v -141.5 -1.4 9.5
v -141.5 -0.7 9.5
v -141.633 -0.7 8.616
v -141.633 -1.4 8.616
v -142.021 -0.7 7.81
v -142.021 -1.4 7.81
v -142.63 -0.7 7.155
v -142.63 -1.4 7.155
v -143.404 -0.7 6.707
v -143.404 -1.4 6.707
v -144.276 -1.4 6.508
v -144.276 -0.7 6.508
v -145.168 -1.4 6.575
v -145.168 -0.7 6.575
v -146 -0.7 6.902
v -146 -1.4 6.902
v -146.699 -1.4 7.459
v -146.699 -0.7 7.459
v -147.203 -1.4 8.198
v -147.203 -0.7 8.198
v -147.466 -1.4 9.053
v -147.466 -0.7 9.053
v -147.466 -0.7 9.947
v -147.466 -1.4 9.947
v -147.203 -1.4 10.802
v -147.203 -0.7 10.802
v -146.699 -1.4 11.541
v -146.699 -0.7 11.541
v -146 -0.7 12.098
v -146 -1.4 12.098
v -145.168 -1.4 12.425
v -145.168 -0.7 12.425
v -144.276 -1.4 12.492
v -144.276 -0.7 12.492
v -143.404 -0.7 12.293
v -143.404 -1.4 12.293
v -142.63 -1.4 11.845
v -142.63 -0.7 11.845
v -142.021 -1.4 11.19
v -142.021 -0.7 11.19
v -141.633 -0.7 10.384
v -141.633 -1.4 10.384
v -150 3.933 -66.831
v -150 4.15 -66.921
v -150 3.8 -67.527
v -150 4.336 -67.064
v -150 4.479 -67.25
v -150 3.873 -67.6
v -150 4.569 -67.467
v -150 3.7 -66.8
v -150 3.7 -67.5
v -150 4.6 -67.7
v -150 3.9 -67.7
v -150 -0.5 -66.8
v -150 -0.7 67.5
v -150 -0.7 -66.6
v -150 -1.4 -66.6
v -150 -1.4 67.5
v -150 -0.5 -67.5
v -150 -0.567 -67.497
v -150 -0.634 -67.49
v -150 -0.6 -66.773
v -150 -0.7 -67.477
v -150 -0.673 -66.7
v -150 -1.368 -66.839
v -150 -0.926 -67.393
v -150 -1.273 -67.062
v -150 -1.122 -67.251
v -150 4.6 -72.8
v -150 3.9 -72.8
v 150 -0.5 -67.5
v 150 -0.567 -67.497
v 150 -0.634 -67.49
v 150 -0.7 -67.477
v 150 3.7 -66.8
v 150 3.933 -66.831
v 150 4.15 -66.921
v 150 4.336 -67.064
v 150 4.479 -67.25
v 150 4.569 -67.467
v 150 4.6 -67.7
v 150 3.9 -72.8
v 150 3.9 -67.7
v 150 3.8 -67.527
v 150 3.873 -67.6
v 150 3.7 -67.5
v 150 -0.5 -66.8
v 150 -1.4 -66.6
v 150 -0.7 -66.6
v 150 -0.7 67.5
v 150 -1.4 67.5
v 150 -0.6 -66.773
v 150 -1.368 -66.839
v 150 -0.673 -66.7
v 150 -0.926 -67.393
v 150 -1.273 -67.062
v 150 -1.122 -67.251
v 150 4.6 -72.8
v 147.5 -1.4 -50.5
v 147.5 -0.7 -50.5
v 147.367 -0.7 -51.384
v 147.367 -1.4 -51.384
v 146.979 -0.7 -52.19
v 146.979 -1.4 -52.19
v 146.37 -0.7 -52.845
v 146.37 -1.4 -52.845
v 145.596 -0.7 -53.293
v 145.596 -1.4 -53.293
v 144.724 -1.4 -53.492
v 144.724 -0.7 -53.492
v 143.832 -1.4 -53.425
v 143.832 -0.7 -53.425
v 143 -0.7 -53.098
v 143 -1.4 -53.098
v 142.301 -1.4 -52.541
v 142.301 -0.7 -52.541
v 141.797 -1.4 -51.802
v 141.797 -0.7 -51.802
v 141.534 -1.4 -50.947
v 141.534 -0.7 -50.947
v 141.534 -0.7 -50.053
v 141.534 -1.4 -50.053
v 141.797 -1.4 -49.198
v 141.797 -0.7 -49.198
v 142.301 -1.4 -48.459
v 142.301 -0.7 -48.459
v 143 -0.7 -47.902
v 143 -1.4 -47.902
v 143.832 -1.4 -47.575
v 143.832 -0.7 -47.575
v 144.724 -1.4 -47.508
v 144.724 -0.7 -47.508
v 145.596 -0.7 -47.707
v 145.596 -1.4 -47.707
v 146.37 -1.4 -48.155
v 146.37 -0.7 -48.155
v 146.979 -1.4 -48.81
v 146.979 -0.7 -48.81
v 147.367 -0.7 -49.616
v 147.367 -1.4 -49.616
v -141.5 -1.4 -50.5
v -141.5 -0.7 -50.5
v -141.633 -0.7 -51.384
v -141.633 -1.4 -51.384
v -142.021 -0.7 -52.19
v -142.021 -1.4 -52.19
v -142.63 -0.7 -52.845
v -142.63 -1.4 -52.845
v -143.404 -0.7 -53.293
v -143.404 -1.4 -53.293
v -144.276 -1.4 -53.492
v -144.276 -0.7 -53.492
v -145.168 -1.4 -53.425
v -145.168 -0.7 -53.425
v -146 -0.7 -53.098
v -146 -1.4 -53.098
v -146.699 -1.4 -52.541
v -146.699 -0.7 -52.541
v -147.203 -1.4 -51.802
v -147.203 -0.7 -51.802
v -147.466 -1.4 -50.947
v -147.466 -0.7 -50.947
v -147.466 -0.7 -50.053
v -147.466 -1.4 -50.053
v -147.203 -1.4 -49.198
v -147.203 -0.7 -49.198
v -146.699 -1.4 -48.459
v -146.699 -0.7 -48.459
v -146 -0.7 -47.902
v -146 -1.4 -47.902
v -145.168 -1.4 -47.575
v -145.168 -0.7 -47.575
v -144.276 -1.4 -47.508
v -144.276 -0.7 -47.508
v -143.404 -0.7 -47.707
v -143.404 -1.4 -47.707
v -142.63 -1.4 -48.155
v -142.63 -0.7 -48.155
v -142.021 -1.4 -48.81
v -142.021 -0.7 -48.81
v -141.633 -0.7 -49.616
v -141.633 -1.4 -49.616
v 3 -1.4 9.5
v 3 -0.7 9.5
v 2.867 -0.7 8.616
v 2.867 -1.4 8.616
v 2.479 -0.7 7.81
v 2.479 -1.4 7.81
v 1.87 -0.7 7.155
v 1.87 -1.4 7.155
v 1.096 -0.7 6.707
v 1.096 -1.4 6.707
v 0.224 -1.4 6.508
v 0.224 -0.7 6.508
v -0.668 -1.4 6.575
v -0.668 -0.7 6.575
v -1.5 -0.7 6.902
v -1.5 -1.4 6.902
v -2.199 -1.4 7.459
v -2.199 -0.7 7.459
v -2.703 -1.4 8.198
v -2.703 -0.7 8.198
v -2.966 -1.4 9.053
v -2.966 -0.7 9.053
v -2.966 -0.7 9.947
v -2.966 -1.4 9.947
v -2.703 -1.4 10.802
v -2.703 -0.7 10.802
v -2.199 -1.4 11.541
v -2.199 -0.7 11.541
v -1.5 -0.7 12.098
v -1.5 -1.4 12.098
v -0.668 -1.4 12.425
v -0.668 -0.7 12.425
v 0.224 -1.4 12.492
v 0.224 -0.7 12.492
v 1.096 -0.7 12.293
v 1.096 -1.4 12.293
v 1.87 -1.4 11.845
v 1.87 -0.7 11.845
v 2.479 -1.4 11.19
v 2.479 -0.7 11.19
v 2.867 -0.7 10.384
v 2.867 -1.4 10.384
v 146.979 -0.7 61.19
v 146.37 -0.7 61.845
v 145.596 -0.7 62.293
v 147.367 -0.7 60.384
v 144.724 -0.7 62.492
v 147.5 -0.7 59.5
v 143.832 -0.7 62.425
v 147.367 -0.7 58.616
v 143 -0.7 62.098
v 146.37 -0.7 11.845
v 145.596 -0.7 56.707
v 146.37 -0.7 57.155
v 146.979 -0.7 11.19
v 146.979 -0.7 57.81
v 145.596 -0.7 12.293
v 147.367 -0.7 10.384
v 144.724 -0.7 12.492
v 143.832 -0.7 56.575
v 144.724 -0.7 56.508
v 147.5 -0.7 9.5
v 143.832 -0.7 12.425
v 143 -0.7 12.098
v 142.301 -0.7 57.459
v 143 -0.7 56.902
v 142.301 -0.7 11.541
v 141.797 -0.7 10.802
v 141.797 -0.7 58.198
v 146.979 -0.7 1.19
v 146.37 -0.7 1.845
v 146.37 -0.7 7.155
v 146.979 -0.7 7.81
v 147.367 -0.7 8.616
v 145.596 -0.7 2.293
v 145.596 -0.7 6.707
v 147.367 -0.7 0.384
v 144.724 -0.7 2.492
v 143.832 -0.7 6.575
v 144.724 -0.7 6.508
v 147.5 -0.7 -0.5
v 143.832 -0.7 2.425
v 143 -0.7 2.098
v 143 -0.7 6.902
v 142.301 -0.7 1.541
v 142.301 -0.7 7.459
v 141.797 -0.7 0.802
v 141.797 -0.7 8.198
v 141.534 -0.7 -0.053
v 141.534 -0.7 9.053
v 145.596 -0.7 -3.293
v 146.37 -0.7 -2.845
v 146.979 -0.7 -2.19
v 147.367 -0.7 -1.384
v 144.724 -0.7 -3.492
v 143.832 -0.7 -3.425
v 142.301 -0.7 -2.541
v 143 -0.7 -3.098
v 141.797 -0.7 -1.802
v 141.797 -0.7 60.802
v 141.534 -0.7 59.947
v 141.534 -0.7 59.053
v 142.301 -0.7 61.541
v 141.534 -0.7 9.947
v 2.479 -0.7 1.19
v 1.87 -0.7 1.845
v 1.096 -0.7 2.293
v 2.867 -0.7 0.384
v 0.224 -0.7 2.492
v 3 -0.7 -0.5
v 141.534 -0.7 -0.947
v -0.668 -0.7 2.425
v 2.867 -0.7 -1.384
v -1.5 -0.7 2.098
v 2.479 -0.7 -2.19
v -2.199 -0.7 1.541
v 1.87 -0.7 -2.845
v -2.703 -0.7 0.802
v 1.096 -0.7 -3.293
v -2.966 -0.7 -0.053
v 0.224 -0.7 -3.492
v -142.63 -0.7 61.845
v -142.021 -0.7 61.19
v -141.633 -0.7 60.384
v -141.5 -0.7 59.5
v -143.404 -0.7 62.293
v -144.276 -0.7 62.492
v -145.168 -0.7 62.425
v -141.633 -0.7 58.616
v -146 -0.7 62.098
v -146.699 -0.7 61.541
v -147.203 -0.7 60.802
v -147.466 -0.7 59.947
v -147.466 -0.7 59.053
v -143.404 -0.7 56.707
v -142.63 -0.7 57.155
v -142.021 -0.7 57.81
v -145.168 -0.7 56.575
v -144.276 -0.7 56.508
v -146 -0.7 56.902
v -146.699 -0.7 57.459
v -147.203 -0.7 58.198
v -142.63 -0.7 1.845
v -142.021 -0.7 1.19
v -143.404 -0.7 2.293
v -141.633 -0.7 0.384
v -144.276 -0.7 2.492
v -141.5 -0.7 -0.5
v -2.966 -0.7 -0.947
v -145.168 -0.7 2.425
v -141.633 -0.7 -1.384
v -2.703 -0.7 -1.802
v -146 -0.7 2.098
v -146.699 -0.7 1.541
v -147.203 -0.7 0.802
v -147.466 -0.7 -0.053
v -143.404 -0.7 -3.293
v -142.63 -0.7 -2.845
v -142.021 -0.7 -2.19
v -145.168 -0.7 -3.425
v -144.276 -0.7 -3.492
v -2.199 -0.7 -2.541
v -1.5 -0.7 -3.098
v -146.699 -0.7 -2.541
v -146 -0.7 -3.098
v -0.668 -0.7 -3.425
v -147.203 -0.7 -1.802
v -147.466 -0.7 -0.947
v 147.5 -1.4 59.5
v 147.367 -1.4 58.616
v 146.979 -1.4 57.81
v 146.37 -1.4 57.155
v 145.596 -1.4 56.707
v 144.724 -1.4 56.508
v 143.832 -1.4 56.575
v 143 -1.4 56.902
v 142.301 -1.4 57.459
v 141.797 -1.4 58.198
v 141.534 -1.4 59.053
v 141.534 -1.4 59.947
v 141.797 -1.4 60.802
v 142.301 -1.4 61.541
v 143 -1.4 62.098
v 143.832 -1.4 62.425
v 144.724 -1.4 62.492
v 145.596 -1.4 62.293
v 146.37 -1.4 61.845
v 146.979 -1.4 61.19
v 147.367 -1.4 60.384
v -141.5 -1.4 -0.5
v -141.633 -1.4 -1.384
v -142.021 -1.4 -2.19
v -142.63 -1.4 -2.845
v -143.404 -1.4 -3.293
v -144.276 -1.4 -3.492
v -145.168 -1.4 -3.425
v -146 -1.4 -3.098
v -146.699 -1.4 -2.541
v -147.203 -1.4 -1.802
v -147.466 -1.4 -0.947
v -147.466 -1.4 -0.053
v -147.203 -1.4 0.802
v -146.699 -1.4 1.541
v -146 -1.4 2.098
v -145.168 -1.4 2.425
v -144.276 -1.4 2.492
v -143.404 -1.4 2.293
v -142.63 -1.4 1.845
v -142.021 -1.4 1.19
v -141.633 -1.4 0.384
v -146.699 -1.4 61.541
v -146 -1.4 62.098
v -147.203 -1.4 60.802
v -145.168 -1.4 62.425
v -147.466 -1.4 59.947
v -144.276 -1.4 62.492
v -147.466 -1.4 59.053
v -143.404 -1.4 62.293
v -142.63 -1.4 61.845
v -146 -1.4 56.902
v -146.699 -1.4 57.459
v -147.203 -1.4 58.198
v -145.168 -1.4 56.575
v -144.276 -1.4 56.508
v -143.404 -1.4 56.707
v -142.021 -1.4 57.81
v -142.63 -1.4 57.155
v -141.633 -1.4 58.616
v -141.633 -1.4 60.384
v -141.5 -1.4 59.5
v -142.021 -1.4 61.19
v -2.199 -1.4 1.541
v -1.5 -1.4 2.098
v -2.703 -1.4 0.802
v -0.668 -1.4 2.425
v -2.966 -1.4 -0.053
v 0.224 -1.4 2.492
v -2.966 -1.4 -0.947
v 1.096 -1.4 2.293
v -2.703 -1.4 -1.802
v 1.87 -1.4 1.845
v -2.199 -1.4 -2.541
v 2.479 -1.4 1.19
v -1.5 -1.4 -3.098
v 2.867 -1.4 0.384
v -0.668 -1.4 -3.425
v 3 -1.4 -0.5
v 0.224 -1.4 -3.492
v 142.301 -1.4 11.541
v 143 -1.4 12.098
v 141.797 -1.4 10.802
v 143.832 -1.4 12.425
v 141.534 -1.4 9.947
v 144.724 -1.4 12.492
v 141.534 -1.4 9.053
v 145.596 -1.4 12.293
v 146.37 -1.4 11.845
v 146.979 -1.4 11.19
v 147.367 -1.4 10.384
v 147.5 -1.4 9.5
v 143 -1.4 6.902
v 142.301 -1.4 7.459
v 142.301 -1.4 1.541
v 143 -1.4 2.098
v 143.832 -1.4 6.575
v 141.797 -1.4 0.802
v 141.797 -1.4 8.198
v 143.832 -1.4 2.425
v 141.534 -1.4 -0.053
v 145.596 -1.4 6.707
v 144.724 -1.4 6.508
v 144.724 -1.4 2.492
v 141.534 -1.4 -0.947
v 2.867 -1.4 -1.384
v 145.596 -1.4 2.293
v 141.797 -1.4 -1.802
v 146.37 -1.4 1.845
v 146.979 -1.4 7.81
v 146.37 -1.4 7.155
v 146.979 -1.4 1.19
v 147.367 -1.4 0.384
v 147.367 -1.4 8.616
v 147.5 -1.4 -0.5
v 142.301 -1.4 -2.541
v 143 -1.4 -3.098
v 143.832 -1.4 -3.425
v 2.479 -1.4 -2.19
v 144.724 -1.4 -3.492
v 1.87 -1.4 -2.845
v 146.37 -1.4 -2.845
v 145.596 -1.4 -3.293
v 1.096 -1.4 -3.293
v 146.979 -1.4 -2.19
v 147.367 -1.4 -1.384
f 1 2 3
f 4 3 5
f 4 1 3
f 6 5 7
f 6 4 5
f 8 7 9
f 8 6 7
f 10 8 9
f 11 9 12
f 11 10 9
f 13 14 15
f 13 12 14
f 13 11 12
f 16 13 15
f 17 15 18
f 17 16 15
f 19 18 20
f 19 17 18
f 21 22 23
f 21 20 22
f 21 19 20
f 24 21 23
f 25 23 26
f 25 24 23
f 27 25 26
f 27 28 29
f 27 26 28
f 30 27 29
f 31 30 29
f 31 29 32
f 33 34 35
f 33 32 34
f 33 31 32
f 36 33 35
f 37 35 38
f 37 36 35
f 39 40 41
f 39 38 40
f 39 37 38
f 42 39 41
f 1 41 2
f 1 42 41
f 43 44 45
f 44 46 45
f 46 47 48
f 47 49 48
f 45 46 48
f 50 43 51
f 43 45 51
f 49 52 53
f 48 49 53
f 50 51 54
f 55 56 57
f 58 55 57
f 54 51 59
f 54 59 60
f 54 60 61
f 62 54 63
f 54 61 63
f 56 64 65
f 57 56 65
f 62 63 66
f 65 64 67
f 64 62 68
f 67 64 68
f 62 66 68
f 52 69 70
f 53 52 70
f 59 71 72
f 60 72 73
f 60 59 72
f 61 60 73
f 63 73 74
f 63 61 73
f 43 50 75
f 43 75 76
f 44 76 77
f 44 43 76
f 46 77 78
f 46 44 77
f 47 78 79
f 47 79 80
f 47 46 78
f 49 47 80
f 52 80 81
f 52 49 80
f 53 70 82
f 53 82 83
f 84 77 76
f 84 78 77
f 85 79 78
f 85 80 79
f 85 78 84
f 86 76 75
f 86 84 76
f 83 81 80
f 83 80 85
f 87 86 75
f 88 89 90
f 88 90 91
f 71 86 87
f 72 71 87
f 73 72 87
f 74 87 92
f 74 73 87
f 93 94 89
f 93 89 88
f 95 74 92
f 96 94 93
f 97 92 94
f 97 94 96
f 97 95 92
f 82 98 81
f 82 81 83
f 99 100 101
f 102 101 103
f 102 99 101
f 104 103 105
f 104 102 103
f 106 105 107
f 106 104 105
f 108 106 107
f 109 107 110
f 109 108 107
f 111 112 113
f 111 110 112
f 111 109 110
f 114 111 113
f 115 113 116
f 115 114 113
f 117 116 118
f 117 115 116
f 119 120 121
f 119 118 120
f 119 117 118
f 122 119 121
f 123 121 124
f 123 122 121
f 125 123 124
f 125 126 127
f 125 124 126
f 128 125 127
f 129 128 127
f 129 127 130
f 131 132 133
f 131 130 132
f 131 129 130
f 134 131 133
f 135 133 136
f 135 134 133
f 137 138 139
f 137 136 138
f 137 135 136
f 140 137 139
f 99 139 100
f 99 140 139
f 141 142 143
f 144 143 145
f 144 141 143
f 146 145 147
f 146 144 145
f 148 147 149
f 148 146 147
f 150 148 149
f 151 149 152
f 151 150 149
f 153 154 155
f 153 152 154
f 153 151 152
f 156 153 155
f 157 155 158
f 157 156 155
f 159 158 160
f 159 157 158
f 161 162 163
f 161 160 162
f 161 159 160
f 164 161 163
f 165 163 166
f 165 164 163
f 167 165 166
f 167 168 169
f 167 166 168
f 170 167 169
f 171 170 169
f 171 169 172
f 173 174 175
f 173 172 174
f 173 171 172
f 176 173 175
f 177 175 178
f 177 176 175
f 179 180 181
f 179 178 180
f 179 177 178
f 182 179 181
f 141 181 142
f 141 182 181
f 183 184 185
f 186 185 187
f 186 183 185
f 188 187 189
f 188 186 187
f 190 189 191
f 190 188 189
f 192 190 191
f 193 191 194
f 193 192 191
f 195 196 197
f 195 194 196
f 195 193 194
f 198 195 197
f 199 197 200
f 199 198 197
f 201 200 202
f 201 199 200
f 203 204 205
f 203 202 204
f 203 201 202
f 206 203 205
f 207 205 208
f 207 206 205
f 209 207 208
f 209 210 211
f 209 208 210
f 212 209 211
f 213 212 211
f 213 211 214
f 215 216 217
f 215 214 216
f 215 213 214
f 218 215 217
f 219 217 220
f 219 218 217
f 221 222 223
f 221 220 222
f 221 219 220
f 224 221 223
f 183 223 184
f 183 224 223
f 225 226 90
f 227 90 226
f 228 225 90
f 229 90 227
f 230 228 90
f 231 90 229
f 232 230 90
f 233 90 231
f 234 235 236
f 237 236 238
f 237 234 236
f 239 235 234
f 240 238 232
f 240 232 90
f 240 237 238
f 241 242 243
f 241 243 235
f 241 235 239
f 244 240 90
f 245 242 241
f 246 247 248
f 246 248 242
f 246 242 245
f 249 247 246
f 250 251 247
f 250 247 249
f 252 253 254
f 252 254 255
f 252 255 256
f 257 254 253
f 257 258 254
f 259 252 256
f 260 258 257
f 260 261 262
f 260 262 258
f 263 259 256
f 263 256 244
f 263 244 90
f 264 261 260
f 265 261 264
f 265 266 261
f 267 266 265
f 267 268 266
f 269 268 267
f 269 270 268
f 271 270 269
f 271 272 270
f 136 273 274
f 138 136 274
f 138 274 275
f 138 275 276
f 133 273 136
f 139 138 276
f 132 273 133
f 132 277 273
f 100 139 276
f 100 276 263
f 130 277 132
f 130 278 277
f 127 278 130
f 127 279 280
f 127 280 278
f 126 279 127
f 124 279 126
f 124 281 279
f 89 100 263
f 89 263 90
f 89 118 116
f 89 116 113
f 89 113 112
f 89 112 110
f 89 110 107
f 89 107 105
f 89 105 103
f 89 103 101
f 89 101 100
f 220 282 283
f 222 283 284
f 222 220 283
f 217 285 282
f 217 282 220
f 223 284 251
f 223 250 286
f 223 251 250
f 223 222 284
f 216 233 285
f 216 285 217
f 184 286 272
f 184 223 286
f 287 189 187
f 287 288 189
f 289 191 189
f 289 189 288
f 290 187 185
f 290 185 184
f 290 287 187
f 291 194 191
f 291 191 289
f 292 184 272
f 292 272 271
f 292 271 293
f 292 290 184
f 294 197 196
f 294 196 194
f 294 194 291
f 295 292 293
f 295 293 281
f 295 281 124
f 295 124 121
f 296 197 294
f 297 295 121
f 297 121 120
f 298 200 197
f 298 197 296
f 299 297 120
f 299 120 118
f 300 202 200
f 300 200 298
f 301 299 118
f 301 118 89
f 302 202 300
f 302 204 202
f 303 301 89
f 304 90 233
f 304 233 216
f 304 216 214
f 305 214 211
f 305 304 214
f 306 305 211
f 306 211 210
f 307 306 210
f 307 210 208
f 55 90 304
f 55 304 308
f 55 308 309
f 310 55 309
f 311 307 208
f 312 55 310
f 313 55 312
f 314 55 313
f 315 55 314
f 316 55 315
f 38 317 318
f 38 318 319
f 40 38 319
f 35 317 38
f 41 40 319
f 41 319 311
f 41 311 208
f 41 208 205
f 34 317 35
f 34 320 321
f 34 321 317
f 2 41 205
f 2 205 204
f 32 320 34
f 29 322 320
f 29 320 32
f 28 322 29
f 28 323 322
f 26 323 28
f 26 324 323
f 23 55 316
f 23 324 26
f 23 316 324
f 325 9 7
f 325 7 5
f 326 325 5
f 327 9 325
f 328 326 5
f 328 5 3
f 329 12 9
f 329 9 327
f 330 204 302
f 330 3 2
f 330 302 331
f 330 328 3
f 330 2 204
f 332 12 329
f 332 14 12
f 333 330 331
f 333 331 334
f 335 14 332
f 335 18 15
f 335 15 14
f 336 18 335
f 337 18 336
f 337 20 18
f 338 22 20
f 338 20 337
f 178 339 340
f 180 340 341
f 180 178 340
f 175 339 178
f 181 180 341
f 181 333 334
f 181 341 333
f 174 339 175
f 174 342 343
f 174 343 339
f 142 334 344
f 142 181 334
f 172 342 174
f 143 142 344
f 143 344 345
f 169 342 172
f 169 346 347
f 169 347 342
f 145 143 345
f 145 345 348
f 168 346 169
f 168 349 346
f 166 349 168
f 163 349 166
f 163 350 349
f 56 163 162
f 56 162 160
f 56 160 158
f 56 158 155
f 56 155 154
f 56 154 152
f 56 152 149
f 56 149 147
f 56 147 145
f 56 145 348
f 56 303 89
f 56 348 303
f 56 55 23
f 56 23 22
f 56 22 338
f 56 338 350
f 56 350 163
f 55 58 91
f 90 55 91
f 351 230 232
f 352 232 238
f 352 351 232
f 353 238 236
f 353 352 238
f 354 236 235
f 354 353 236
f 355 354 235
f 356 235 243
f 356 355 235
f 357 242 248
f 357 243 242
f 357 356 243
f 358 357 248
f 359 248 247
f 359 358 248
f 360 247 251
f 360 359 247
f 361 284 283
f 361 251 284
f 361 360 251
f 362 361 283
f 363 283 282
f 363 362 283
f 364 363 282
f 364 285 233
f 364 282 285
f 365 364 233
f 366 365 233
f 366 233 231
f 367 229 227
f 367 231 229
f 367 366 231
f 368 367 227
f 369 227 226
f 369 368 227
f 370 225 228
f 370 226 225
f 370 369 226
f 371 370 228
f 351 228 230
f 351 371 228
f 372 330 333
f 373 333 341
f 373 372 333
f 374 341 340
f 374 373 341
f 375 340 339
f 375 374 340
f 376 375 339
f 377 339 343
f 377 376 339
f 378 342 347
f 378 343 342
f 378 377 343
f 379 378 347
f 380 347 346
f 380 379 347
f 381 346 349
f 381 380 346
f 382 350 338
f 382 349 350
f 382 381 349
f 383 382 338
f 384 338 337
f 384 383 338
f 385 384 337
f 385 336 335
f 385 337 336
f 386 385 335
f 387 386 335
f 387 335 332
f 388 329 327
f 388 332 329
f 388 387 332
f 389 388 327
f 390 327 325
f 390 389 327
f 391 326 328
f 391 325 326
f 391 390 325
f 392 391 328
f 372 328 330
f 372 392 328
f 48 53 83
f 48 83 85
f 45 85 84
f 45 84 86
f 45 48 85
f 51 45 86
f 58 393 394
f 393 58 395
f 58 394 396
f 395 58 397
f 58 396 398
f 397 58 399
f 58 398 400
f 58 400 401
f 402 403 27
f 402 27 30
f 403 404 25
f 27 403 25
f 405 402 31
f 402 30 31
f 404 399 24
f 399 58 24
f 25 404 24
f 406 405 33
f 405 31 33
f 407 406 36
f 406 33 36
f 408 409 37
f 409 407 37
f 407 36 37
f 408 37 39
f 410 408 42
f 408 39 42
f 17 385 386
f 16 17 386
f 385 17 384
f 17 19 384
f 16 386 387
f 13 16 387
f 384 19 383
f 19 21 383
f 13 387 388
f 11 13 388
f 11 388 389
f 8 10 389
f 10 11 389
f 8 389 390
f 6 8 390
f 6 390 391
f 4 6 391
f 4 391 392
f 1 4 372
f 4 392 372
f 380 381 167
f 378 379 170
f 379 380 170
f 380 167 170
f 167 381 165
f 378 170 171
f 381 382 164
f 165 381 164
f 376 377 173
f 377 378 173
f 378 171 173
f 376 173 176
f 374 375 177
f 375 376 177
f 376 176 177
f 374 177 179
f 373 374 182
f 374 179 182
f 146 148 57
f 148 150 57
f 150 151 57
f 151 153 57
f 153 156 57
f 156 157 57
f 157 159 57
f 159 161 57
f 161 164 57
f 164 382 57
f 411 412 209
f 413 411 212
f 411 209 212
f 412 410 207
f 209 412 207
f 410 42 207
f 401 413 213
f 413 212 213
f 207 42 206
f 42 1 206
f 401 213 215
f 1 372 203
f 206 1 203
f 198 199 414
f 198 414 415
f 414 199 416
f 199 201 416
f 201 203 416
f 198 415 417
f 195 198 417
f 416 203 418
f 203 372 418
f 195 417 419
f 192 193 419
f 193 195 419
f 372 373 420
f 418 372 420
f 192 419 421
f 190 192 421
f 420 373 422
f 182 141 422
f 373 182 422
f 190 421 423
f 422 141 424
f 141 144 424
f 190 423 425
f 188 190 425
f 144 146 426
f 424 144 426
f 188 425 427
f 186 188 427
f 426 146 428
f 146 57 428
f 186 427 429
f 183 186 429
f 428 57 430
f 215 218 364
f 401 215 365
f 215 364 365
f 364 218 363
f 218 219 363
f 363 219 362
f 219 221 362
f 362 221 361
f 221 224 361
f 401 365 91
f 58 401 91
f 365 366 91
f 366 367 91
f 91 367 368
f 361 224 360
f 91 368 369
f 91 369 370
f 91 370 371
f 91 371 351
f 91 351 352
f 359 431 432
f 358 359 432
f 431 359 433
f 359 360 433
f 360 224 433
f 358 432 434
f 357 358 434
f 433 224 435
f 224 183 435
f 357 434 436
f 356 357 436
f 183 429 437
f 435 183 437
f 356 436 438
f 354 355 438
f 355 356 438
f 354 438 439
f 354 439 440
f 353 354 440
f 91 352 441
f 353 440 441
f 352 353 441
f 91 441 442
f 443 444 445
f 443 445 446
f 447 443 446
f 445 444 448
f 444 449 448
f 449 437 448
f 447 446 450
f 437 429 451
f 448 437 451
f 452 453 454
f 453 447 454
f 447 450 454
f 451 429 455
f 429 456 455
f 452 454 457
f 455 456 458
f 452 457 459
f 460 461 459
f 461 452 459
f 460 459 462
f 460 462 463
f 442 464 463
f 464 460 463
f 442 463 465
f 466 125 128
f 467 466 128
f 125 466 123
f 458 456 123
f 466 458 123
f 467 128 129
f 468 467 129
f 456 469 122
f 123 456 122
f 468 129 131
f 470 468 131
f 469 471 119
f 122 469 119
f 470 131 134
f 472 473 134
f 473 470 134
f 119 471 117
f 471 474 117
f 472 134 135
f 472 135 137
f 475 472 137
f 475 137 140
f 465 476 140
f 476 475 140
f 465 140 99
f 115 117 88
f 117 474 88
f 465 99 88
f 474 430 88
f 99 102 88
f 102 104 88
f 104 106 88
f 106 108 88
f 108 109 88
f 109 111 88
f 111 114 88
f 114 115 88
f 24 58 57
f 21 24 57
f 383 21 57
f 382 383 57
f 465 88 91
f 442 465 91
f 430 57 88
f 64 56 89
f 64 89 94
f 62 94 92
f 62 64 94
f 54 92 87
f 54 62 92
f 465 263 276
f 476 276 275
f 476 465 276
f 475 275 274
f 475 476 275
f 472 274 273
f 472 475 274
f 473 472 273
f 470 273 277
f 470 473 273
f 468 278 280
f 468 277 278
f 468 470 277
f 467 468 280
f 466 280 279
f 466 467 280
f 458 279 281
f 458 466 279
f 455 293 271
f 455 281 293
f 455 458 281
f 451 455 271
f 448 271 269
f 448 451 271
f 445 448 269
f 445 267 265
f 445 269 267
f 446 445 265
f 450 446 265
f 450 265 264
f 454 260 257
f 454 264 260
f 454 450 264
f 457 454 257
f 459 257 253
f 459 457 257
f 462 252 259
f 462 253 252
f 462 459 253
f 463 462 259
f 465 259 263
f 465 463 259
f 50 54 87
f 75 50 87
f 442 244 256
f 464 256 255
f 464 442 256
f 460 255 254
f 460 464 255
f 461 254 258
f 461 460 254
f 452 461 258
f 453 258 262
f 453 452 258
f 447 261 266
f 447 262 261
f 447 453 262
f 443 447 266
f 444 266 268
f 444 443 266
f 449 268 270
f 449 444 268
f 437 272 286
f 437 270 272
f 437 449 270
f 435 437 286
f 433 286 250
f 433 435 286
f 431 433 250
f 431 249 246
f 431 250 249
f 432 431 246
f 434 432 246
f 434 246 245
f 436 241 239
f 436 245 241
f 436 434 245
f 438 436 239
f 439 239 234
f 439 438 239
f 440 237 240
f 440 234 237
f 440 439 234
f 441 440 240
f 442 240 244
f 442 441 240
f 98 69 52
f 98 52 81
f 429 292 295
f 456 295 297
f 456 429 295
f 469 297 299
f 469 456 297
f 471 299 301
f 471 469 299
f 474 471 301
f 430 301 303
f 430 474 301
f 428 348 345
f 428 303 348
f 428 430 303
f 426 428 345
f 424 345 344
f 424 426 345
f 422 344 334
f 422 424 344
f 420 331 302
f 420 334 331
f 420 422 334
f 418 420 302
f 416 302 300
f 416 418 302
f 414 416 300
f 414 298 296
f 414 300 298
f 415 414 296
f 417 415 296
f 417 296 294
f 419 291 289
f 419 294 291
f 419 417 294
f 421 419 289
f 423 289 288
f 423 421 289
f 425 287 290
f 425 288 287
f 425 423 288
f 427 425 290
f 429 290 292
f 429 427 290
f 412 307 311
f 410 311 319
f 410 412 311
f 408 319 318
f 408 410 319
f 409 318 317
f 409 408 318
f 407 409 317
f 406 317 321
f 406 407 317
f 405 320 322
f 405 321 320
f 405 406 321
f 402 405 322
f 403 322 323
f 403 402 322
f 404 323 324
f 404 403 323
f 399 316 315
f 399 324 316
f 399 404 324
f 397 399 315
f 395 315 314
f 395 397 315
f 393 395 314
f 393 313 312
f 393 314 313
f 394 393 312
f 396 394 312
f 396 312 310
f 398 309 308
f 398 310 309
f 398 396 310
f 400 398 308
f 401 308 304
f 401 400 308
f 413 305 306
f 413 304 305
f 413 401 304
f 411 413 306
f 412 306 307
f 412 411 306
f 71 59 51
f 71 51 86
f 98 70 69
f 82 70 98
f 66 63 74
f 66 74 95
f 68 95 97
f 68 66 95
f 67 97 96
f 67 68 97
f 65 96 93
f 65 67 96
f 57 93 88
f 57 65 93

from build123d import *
from build123d.topology import SkipClean

# Parameters (mm, degrees)
SKETCH_1_W                       = 300
SKETCH_1_H                       = 135
SKETCH_1_R                       = 3
SM_BASE_FLANGE_1_DEPTH           = 0.7
SM_EDGE_FLANGE_1_STRIP_W         = 3.2
SM_EDGE_FLANGE_1_STRIP_H         = 0.7
SM_EDGE_FLANGE_1_STRIP_CUT_DEPTH = 300
SM_EDGE_FLANGE_1_DEPTH           = 300
SM_EDGE_FLANGE_2_STRIP_W         = 3.2
SM_EDGE_FLANGE_2_STRIP_H         = 0.7
SM_EDGE_FLANGE_2_STRIP_CUT_DEPTH = 300
SM_EDGE_FLANGE_2_DEPTH           = 300
MOVE_START                       = -0.5
MOVE_BODY_1_OUTLINE_W            = 300
MOVE_BODY_1_OUTLINE_H            = 134.3
MOVE_BODY_1_OUTLINE_R            = 3
MOVE_BODY_1_DEPTH                = 0.5
MOVE_START_2                     = -6
MOVE_BODY_1_2_OUTLINE_W          = 300
MOVE_BODY_1_2_OUTLINE_H          = 6
MOVE_BODY_1_2_DEPTH              = 4.6
MOVE_START_3                     = -1.343604
MOVE_BODY_1_3_OUTLINE_W          = 300
MOVE_BODY_1_3_OUTLINE_H          = 134.3
MOVE_BODY_1_3_OUTLINE_R          = 3
MOVE_BODY_1_3_DEPTH              = 0.643604
MOVE_BODY_1_4_OUTLINE_W          = 300
MOVE_BODY_1_4_OUTLINE_H          = 0.7
MOVE_BODY_1_4_DEPTH              = 4.2
MOVE_START_4                     = -1.4
MOVE_BODY_1_5_OUTLINE_W          = 300
MOVE_BODY_1_5_OUTLINE_H          = 134.3
MOVE_BODY_1_5_OUTLINE_R          = 3
MOVE_BODY_1_5_DEPTH              = 0.056396
MOVE_START_5                     = 3.7
MOVE_BODY_1_6_OUTLINE_W          = 300
MOVE_BODY_1_6_OUTLINE_H          = 6
MOVE_BODY_1_6_DEPTH              = 0.9
MOVE_START_6                     = -0.7
MOVE_BODY_1_7_OUTLINE_W          = 300
MOVE_BODY_1_7_OUTLINE_H          = 0.7
MOVE_BODY_1_7_DEPTH              = 0.2
MOVE_START_7                     = -151
MOVE_BODY_1_8_DEPTH              = 301


with BuildPart() as part:
    # 基体-法兰1: sheet metal written as solids
    # 草图1 → 基体-法兰1 (new body)
    with BuildSketch(Plane(origin=(0, 0, 0), x_dir=(1, 0, 0), z_dir=(0, 1, 0))):
        Rectangle(SKETCH_1_W, SKETCH_1_H)
        with Locations(Location((-144.5, -59.5, 0), (0, 0, 270))):
            Circle(SKETCH_1_R, mode=Mode.SUBTRACT)
        with Locations(Location((-144.5, -9.5, 0), (0, 0, 270))):
            Circle(SKETCH_1_R, mode=Mode.SUBTRACT)
        with Locations(Location((-144.5, 0.5, 0), (0, 0, 270))):
            Circle(SKETCH_1_R, mode=Mode.SUBTRACT)
        with Locations(Location((-144.5, 50.5, 0), (0, 0, 270))):
            Circle(SKETCH_1_R, mode=Mode.SUBTRACT)
        with Locations(Location((0, -9.5, 0), (0, 0, 270))):
            Circle(SKETCH_1_R, mode=Mode.SUBTRACT)
        with Locations(Location((0, 0.5, 0), (0, 0, 270))):
            Circle(SKETCH_1_R, mode=Mode.SUBTRACT)
        with Locations(Location((144.5, -59.5, 0), (0, 0, 90))):
            Circle(SKETCH_1_R, mode=Mode.SUBTRACT)
        with Locations(Location((144.5, -9.5, 0), (0, 0, 90))):
            Circle(SKETCH_1_R, mode=Mode.SUBTRACT)
        with Locations(Location((144.5, 0.5, 0), (0, 0, 90))):
            Circle(SKETCH_1_R, mode=Mode.SUBTRACT)
        with Locations(Location((144.5, 50.5, 0), (0, 0, 90))):
            Circle(SKETCH_1_R, mode=Mode.SUBTRACT)
    extrude(amount=-SM_BASE_FLANGE_1_DEPTH)

    # 边线-法兰1: sheet metal written as solids
    # 边线-法兰1 strip (on a plane across the edge) → 边线-法兰1 strip cut (cut)
    with BuildSketch(Plane(origin=(-150, -0.7, -67.5), x_dir=(0, 0, 1), z_dir=(1, 0, 0))):
        with Locations((-0.7, -0.35)):
            Rectangle(SM_EDGE_FLANGE_1_STRIP_W, SM_EDGE_FLANGE_1_STRIP_H)
    extrude(amount=SM_EDGE_FLANGE_1_STRIP_CUT_DEPTH, mode=Mode.SUBTRACT)

    # 边线-法兰1 section (on a plane across the edge) → 边线-法兰1 (add)
    with BuildSketch(Plane(origin=(-150, -0.7, -67.5), x_dir=(0, 0, 1), z_dir=(1, 0, 0))):
        with BuildLine():
            Line((0, 0.2), (0, 5.3))
            Line((0, 5.3), (0.7, 5.3))
            Line((0.7, 5.3), (0.7, 0.2))
            ThreePointArc((0.7, 0.2), (0.758578644, 0.058578644), (0.9, 0))
            Line((0.9, 0), (0.9, -0.7))
            ThreePointArc((0.9, -0.7), (0.263603897, -0.436396103), (0, 0.2))
        make_face()
    extrude(amount=SM_EDGE_FLANGE_1_DEPTH)

    # 边线-法兰2: sheet metal written as solids
    # 边线-法兰2 strip (on a plane across the edge) → 边线-法兰2 strip cut (cut)
    with BuildSketch(Plane(origin=(150, -6, -67.5), x_dir=(0, 1, 0), z_dir=(-1, 0, 0))):
        with Locations((-0.7, -0.35)):
            Rectangle(SM_EDGE_FLANGE_2_STRIP_W, SM_EDGE_FLANGE_2_STRIP_H)
    extrude(amount=SM_EDGE_FLANGE_2_STRIP_CUT_DEPTH, mode=Mode.SUBTRACT)

    # 边线-法兰2 section (on a plane across the edge) → 边线-法兰2 (add)
    with BuildSketch(Plane(origin=(150, -6, -67.5), x_dir=(0, 1, 0), z_dir=(-1, 0, 0))):
        with BuildLine():
            Line((0, 0.2), (0, 5.3))
            Line((0, 5.3), (0.7, 5.3))
            Line((0.7, 5.3), (0.7, 0.2))
            ThreePointArc((0.7, 0.2), (0.758578644, 0.058578644), (0.9, 0))
            Line((0.9, 0), (0.9, -0.7))
            ThreePointArc((0.9, -0.7), (0.263603897, -0.436396103), (0, 0.2))
        make_face()
    extrude(amount=SM_EDGE_FLANGE_2_DEPTH)

    # Move Body 1: read off the stored shape, not the designer's step
    # Move Body 1 outline → Move Body 1 (cut)
    with BuildSketch(Plane(origin=(0, 0, 0), x_dir=(1, 0, 0), z_dir=(0, 1, 0)).offset(MOVE_START)):
        with Locations((0, -0.35)):
            Rectangle(MOVE_BODY_1_OUTLINE_W, MOVE_BODY_1_OUTLINE_H)
        with Locations((-144.5, -59.5)):
            Circle(MOVE_BODY_1_OUTLINE_R, mode=Mode.SUBTRACT)
        with Locations((-144.5, -9.5)):
            Circle(MOVE_BODY_1_OUTLINE_R, mode=Mode.SUBTRACT)
        with Locations((-144.5, 0.5)):
            Circle(MOVE_BODY_1_OUTLINE_R, mode=Mode.SUBTRACT)
        with Locations((144.5, -59.5)):
            Circle(MOVE_BODY_1_OUTLINE_R, mode=Mode.SUBTRACT)
        with Locations((0, -9.5)):
            Circle(MOVE_BODY_1_OUTLINE_R, mode=Mode.SUBTRACT)
        with Locations((0, 0.5)):
            Circle(MOVE_BODY_1_OUTLINE_R, mode=Mode.SUBTRACT)
        with Locations((144.5, -9.5)):
            Circle(MOVE_BODY_1_OUTLINE_R, mode=Mode.SUBTRACT)
        with Locations((144.5, 0.5)):
            Circle(MOVE_BODY_1_OUTLINE_R, mode=Mode.SUBTRACT)
        with Locations((-144.5, 50.5)):
            Circle(MOVE_BODY_1_OUTLINE_R, mode=Mode.SUBTRACT)
        with Locations((144.5, 50.5)):
            Circle(MOVE_BODY_1_OUTLINE_R, mode=Mode.SUBTRACT)
    extrude(amount=MOVE_BODY_1_DEPTH, mode=Mode.SUBTRACT)

    # Move Body 1 2 outline → Move Body 1 2 (cut)
    with BuildSketch(Plane(origin=(0, 0, 0), x_dir=(1, 0, 0), z_dir=(0, 1, 0)).offset(MOVE_START_2)):
        with Locations((0, 69.8)):
            Rectangle(MOVE_BODY_1_2_OUTLINE_W, MOVE_BODY_1_2_OUTLINE_H)
    extrude(amount=MOVE_BODY_1_2_DEPTH, mode=Mode.SUBTRACT)

    # Move Body 1 3 outline → Move Body 1 3 (add)
    with SkipClean():  # the faces are left unmerged after this step: merging them gives an invalid solid
        with BuildSketch(Plane(origin=(0, 0, 0), x_dir=(1, 0, 0), z_dir=(0, 1, 0)).offset(MOVE_START_3)):
            with Locations((0, -0.35)):
                Rectangle(MOVE_BODY_1_3_OUTLINE_W, MOVE_BODY_1_3_OUTLINE_H)
            with Locations((-144.5, -59.5)):
                Circle(MOVE_BODY_1_3_OUTLINE_R, mode=Mode.SUBTRACT)
            with Locations((-144.5, -9.5)):
                Circle(MOVE_BODY_1_3_OUTLINE_R, mode=Mode.SUBTRACT)
            with Locations((-144.5, 0.5)):
                Circle(MOVE_BODY_1_3_OUTLINE_R, mode=Mode.SUBTRACT)
            with Locations((144.5, -59.5)):
                Circle(MOVE_BODY_1_3_OUTLINE_R, mode=Mode.SUBTRACT)
            with Locations((0, -9.5)):
                Circle(MOVE_BODY_1_3_OUTLINE_R, mode=Mode.SUBTRACT)
            with Locations((0, 0.5)):
                Circle(MOVE_BODY_1_3_OUTLINE_R, mode=Mode.SUBTRACT)
            with Locations((144.5, -9.5)):
                Circle(MOVE_BODY_1_3_OUTLINE_R, mode=Mode.SUBTRACT)
            with Locations((144.5, 0.5)):
                Circle(MOVE_BODY_1_3_OUTLINE_R, mode=Mode.SUBTRACT)
            with Locations((-144.5, 50.5)):
                Circle(MOVE_BODY_1_3_OUTLINE_R, mode=Mode.SUBTRACT)
            with Locations((144.5, 50.5)):
                Circle(MOVE_BODY_1_3_OUTLINE_R, mode=Mode.SUBTRACT)
        extrude(amount=MOVE_BODY_1_3_DEPTH)

    # Move Body 1 4 outline → Move Body 1 4 (add)
    with SkipClean():  # the faces are left unmerged after this step: merging them gives an invalid solid
        with BuildSketch(Plane(origin=(0, 0, 0), x_dir=(1, 0, 0), z_dir=(0, 1, 0)).offset(MOVE_START)):
            with Locations((0, 67.15)):
                Rectangle(MOVE_BODY_1_4_OUTLINE_W, MOVE_BODY_1_4_OUTLINE_H)
        extrude(amount=MOVE_BODY_1_4_DEPTH)

    # Move Body 1 5 outline → Move Body 1 5 (add)
    with SkipClean():  # the faces are left unmerged after this step: merging them gives an invalid solid
        with BuildSketch(Plane(origin=(0, 0, 0), x_dir=(1, 0, 0), z_dir=(0, 1, 0)).offset(MOVE_START_4)):
            with Locations((0, -0.35)):
                Rectangle(MOVE_BODY_1_5_OUTLINE_W, MOVE_BODY_1_5_OUTLINE_H)
            with Locations((-144.5, -59.5)):
                Circle(MOVE_BODY_1_5_OUTLINE_R, mode=Mode.SUBTRACT)
            with Locations((-144.5, -9.5)):
                Circle(MOVE_BODY_1_5_OUTLINE_R, mode=Mode.SUBTRACT)
            with Locations((-144.5, 0.5)):
                Circle(MOVE_BODY_1_5_OUTLINE_R, mode=Mode.SUBTRACT)
            with Locations((144.5, -59.5)):
                Circle(MOVE_BODY_1_5_OUTLINE_R, mode=Mode.SUBTRACT)
            with Locations((0, -9.5)):
                Circle(MOVE_BODY_1_5_OUTLINE_R, mode=Mode.SUBTRACT)
            with Locations((0, 0.5)):
                Circle(MOVE_BODY_1_5_OUTLINE_R, mode=Mode.SUBTRACT)
            with Locations((144.5, -9.5)):
                Circle(MOVE_BODY_1_5_OUTLINE_R, mode=Mode.SUBTRACT)
            with Locations((144.5, 0.5)):
                Circle(MOVE_BODY_1_5_OUTLINE_R, mode=Mode.SUBTRACT)
            with Locations((-144.5, 50.5)):
                Circle(MOVE_BODY_1_5_OUTLINE_R, mode=Mode.SUBTRACT)
            with Locations((144.5, 50.5)):
                Circle(MOVE_BODY_1_5_OUTLINE_R, mode=Mode.SUBTRACT)
        extrude(amount=MOVE_BODY_1_5_DEPTH)

    # Move Body 1 6 outline → Move Body 1 6 (add)
    with SkipClean():  # the faces are left unmerged after this step: merging them gives an invalid solid
        with BuildSketch(Plane(origin=(0, 0, 0), x_dir=(1, 0, 0), z_dir=(0, 1, 0)).offset(MOVE_START_5)):
            with Locations((0, 69.8)):
                Rectangle(MOVE_BODY_1_6_OUTLINE_W, MOVE_BODY_1_6_OUTLINE_H)
        extrude(amount=MOVE_BODY_1_6_DEPTH)

    # Move Body 1 7 outline → Move Body 1 7 (add)
    with SkipClean():  # the faces are left unmerged after this step: merging them gives an invalid solid
        with BuildSketch(Plane(origin=(0, 0, 0), x_dir=(1, 0, 0), z_dir=(0, 1, 0)).offset(MOVE_START_6)):
            with Locations((0, 67.15)):
                Rectangle(MOVE_BODY_1_7_OUTLINE_W, MOVE_BODY_1_7_OUTLINE_H)
        extrude(amount=MOVE_BODY_1_7_DEPTH)

    # Move Body 1 8 outline → Move Body 1 8 (cut)
    with BuildSketch(Plane.YZ.offset(MOVE_START_7)):
        with BuildLine():
            Line((-0.5, 67.5), (-0.7, 67.5))
            Line((-0.7, 67.5), (-0.7, -66.6))
            ThreePointArc((-0.7, -66.6), (-0.641421356, -66.741421356), (-0.5, -66.8))
            Line((-0.5, -66.8), (-0.5, 67.5))
        make_face()
        with BuildLine():
            ThreePointArc((-0.7, -67.477496439), (-1.203562364, -67.161248608), (-1.4, -66.6))
            Line((-1.4, -66.6), (-1.4, -67.5))
            Line((-1.4, -67.5), (-0.9, -67.5))
            ThreePointArc((-0.9, -67.5), (-0.799368978, -67.494356415), (-0.7, -67.477496439))
        make_face()
        with BuildLine():
            Line((4.6, -66.8), (3.7, -66.8))
            ThreePointArc((3.7, -66.8), (4.336396103, -67.063603897), (4.6, -67.7))
            Line((4.6, -67.7), (4.6, -66.8))
        make_face()
        with BuildLine():
            ThreePointArc((-0.5, -67.5), (-0.600631022, -67.494356415), (-0.7, -67.477496439))
            Line((-0.7, -67.477496439), (-0.7, -67.5))
            Line((-0.7, -67.5), (-0.5, -67.5))
        make_face()
        with BuildLine():
            ThreePointArc((3.9, -67.7), (3.841421356, -67.558578644), (3.7, -67.5))
            Line((3.7, -67.5), (3.7, -72.8))
            Line((3.7, -72.8), (3.9, -72.8))
            Line((3.9, -72.8), (3.9, -67.7))
        make_face()
    extrude(amount=MOVE_BODY_1_8_DEPTH, mode=Mode.SUBTRACT)


solid = part.part
